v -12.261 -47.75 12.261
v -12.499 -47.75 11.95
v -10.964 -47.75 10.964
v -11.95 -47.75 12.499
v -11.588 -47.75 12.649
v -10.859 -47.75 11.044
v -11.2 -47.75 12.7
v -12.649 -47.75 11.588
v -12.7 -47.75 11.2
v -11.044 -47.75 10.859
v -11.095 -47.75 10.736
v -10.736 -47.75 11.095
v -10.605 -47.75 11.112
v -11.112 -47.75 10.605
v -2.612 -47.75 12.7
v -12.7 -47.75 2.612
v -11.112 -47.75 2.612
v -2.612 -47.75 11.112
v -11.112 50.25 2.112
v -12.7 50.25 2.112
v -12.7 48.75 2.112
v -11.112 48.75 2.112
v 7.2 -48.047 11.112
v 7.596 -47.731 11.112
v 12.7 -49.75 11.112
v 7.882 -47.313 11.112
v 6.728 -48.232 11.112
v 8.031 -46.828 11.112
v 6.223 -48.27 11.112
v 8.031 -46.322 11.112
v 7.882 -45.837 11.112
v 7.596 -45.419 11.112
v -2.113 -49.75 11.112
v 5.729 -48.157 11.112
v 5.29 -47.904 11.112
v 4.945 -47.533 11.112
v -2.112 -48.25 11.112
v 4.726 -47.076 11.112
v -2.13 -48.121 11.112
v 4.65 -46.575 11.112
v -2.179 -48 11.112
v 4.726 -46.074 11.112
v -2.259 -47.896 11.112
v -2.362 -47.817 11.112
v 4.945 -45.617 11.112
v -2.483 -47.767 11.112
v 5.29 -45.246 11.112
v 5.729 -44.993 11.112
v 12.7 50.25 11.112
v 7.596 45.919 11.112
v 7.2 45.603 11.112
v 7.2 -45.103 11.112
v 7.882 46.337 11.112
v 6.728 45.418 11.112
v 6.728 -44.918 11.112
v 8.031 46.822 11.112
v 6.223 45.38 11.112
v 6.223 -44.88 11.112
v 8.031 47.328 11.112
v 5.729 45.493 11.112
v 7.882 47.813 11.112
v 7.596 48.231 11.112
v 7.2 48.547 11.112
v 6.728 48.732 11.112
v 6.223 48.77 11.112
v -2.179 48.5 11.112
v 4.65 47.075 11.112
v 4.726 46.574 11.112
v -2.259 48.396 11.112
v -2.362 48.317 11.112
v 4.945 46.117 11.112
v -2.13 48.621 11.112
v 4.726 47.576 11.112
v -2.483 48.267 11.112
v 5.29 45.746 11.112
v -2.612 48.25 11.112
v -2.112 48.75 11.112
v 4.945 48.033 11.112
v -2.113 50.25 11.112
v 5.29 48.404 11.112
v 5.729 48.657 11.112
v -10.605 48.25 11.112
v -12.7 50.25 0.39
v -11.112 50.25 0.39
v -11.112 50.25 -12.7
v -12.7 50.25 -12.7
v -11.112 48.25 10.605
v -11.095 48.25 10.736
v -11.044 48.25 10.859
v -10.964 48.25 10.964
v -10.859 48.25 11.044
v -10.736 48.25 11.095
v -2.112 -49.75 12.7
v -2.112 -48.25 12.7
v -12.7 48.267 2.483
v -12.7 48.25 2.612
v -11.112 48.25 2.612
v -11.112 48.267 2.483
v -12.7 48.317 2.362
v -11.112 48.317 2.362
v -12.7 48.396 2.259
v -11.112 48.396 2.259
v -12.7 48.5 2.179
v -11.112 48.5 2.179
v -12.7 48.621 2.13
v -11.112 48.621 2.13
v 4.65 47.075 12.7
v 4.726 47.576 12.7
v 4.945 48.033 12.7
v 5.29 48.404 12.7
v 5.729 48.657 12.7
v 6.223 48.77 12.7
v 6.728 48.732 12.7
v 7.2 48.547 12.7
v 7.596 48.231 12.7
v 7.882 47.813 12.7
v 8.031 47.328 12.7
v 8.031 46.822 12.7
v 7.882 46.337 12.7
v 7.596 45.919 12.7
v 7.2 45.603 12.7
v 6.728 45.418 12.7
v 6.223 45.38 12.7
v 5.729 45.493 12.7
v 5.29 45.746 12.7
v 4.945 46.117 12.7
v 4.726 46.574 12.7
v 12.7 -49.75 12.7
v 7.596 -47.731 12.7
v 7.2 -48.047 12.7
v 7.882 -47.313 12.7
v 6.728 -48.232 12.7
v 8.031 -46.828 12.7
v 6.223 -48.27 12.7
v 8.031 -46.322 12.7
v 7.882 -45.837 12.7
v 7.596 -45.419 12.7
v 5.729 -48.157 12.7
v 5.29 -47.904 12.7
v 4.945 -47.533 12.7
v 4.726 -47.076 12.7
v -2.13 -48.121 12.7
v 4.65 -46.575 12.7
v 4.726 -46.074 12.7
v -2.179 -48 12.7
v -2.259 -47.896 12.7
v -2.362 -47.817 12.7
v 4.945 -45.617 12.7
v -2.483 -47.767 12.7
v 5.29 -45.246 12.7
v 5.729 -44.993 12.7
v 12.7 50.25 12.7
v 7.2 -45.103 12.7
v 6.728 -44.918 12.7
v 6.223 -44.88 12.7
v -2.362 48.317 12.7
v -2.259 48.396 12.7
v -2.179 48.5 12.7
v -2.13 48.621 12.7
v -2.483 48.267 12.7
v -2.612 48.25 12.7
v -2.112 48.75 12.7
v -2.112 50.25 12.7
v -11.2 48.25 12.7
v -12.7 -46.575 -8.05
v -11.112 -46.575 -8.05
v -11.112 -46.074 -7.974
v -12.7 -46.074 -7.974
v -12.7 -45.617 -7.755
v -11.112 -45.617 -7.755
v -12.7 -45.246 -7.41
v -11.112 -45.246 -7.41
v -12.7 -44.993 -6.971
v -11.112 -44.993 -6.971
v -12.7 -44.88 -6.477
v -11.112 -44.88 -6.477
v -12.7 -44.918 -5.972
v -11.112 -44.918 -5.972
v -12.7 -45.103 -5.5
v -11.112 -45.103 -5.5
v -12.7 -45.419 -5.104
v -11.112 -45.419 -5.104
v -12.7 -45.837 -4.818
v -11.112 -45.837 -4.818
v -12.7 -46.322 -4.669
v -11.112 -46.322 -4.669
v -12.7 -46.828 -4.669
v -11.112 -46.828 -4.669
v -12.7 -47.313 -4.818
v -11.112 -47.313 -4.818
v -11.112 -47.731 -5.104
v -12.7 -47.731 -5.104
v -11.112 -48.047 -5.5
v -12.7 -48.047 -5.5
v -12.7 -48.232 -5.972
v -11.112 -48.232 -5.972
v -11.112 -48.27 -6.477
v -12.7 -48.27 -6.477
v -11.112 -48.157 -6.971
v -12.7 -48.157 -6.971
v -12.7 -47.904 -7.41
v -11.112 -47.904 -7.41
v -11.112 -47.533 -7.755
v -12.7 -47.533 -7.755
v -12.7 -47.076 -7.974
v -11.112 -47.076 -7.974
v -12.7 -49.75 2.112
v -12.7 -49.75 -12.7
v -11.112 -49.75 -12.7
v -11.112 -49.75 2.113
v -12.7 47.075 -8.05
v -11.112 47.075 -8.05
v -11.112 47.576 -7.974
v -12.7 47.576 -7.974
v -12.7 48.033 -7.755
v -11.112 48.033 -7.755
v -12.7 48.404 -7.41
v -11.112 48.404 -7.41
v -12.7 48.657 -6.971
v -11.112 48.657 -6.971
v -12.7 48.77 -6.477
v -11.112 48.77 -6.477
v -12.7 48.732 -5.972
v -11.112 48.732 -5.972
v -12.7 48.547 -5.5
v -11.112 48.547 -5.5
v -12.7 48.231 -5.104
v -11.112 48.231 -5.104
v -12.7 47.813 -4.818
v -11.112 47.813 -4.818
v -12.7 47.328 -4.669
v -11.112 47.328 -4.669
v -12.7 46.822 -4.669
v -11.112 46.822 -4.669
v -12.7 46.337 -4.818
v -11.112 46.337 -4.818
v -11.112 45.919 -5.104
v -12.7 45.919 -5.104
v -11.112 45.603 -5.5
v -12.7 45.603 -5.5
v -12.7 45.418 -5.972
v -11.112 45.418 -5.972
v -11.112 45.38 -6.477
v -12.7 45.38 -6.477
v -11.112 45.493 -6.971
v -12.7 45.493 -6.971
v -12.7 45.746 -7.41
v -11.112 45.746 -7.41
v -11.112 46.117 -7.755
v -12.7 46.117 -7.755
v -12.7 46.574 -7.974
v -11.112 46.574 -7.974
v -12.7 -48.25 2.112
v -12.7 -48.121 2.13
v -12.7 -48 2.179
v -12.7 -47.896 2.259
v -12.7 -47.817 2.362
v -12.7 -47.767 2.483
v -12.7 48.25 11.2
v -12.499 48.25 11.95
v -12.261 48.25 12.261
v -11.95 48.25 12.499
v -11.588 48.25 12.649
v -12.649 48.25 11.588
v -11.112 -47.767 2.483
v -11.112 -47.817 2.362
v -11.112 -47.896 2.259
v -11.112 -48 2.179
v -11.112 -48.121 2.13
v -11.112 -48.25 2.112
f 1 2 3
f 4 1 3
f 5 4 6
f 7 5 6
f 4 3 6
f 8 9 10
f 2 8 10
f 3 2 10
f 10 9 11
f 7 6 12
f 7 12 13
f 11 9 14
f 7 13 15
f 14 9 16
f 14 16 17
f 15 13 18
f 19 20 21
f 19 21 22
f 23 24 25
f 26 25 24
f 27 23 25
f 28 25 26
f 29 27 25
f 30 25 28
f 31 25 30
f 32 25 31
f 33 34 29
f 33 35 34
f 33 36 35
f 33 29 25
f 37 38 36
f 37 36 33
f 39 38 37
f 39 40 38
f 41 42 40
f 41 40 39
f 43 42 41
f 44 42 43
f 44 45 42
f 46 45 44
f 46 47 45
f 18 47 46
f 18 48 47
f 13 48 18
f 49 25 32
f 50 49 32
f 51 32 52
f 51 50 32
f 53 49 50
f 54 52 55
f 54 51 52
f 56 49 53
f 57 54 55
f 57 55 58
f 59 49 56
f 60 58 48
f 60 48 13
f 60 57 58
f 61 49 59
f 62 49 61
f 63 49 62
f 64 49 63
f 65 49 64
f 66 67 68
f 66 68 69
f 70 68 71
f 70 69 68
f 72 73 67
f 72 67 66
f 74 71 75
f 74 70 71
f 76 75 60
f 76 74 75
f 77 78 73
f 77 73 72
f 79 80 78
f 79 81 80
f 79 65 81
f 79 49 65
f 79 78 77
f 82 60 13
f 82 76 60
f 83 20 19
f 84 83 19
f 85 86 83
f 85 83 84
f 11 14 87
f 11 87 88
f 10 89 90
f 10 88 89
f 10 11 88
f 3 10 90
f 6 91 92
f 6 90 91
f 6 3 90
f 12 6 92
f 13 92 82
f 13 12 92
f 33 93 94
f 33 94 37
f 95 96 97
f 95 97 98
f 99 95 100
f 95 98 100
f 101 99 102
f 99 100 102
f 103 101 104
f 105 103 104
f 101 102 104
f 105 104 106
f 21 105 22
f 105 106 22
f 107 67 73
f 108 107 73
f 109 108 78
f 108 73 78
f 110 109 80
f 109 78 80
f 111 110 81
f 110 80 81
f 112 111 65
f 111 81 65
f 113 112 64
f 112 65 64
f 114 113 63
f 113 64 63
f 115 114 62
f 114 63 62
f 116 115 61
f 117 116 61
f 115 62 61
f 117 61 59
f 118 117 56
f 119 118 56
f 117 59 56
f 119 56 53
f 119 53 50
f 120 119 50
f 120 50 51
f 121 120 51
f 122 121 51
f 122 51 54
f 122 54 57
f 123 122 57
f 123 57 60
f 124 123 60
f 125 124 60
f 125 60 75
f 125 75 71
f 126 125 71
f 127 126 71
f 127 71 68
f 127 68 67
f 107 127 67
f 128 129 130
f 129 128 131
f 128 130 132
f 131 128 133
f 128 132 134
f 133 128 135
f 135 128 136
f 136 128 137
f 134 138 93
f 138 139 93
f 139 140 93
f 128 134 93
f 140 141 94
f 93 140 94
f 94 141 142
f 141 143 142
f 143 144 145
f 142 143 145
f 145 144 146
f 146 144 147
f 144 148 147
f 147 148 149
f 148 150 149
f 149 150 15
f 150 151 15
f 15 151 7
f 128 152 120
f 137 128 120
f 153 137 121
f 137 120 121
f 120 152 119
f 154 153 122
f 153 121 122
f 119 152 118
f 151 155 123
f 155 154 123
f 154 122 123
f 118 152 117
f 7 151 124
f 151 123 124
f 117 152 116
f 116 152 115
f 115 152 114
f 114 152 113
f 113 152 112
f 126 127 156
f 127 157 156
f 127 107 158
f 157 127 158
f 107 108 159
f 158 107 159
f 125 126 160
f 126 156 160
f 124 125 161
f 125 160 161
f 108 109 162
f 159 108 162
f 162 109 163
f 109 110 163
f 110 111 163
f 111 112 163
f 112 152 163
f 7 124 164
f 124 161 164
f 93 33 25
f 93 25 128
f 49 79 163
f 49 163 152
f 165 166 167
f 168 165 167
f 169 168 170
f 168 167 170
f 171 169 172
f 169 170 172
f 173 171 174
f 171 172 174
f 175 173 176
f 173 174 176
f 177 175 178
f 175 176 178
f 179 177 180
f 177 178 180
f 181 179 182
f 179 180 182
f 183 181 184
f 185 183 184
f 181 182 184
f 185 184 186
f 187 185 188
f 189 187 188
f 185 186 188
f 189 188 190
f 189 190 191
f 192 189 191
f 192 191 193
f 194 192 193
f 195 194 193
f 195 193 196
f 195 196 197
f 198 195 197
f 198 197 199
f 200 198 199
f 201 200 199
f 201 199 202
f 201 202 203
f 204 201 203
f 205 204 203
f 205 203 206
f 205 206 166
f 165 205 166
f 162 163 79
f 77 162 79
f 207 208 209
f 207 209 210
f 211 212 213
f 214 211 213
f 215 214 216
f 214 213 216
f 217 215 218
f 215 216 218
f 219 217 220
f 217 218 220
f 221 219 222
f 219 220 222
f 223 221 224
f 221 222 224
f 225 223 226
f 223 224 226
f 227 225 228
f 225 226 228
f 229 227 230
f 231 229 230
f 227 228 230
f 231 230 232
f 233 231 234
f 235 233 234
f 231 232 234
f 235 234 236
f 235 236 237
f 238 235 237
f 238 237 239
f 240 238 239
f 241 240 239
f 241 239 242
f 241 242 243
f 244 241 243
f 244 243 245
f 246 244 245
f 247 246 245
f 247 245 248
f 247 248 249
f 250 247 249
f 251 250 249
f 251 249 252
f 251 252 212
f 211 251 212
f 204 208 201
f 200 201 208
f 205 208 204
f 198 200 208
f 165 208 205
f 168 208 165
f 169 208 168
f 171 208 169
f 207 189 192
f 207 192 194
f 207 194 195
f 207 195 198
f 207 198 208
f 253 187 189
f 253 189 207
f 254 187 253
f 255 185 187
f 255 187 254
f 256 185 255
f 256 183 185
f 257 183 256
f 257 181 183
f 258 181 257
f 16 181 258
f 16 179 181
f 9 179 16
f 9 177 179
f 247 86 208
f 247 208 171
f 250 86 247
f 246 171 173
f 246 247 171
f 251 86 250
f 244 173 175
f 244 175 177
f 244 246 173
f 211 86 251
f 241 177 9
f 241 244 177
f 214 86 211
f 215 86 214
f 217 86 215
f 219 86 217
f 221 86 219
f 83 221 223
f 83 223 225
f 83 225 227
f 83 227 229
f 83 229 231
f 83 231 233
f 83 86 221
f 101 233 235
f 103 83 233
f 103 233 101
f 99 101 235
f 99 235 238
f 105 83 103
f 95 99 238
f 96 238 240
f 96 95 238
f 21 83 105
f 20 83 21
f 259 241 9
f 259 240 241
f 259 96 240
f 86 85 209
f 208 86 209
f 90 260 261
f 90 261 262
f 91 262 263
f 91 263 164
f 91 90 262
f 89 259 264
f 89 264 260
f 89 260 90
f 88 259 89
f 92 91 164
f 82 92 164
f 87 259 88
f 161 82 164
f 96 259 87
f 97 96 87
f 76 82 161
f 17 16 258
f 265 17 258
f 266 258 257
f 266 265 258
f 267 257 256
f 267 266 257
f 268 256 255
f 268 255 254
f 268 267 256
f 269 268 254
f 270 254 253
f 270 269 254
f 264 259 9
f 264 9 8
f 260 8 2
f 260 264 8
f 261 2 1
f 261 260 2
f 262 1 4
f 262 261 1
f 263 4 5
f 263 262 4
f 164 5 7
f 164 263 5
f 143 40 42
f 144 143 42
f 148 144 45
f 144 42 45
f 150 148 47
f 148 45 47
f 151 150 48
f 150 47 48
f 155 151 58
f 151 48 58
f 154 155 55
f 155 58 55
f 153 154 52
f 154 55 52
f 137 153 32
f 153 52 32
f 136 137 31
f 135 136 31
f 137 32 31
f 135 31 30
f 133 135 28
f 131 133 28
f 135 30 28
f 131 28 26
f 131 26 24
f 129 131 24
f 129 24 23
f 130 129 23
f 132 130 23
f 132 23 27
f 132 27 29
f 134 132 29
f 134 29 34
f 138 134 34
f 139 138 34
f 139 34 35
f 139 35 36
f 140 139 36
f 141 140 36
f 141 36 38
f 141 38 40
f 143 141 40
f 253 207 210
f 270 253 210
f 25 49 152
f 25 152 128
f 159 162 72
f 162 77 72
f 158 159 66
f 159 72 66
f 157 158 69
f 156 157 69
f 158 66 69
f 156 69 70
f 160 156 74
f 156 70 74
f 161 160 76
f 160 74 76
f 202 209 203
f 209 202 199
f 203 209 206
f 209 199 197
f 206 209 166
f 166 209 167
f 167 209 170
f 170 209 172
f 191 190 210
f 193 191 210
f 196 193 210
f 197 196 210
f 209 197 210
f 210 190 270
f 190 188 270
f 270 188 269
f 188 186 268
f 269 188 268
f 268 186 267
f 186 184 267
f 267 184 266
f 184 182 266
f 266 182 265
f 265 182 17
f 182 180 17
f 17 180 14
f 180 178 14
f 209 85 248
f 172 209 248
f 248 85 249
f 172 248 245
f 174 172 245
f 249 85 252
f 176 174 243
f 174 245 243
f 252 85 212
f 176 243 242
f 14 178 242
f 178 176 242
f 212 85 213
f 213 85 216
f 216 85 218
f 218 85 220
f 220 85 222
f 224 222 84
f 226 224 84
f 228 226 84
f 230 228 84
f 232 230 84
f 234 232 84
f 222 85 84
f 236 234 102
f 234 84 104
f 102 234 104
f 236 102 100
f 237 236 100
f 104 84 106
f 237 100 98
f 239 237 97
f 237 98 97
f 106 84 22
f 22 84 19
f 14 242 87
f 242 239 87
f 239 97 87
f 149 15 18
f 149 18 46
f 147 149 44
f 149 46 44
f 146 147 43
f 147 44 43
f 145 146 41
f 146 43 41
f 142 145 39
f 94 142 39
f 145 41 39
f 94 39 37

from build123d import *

# Parameters (mm, degrees)
SKETCH1_W            = 25.4
SKETCH1_H            = 25.4
BOSS_EXTRUDE1_DEPTH  = 56.75
SKETCH2_W            = 23.8125
SKETCH2_H            = 23.8125
CUT_EXTRUDE1_DEPTH   = 115.912270885
FILLET1_R            = 0.508
M3_CLEARANCE_HOLE1_D = 3.4
M3_CLEARANCE_HOLE2_D = 3.4
M3_CLEARANCE_HOLE3_D = 3.4
M3_CLEARANCE_HOLE4_D = 3.4
FILLET2_R            = 1.5
CUT_EXTRUDE2_REACH   = 65.459
SKETCH11_W           = 16.9
SKETCH11_H           = 6.499999954
SKETCH11_H_2         = 7
CUT_EXTRUDE3_REACH   = 65.459
SKETCH12_W           = 16.9
SKETCH12_H           = 6.5
SKETCH12_H_2         = 7
FILLET3_R            = 3.81
CUT_EXTRUDE4_REACH   = 65.459
SKETCH13_W           = 15.4
SKETCH13_H           = 87.3
CUT_EXTRUDE5_REACH   = 65.459
SKETCH14_W           = 15.4
SKETCH14_H           = 87.3
CHAMFER2_SIZE        = 6.35
FILLET5_R            = 3.81
SKETCH15_W           = 12.31
SKETCH15_H           = 12.31
CUT_EXTRUDE6_DEPTH   = 6.5
SKETCH17_W           = 12.31
SKETCH17_H           = 12.31
CUT_EXTRUDE8_DEPTH   = 7
BOSS_EXTRUDE2_START  = -1.5875
BOSS_EXTRUDE2_DEPTH  = 1.5875
BOSS_EXTRUDE3_START  = -1.5875
BOSS_EXTRUDE3_DEPTH  = 1.5875
SKETCH22_W           = 10.5875
SKETCH22_H           = 10.5875
CUT_EXTRUDE9_DEPTH   = 2
FILLET6_R            = 0.5
FILLET6_OF_MIRROR1_R = 0.5


with BuildPart() as part:
    # Sketch1 → Boss-Extrude1 (new, symmetric)
    with BuildSketch(Plane(origin=(0, 0, 0), x_dir=(1, 0, 0), z_dir=(0, 1, 0))):
        Rectangle(SKETCH1_W, SKETCH1_H)
    extrude(amount=BOSS_EXTRUDE1_DEPTH, both=True)

    # Sketch2 → Cut-Extrude1 (cut, through all)
    with BuildSketch(Plane(origin=(0, 56.75, 0), x_dir=(1, 0, 0), z_dir=(0, 1, 0))):
        with Locations((0.79375, 0.79375)):
            Rectangle(SKETCH2_W, SKETCH2_H)
    extrude(amount=-CUT_EXTRUDE1_DEPTH, mode=Mode.SUBTRACT)

    # Fillet1
    fillet1_edges = [part.edges().sort_by_distance(p)[0] for p in [
        (-11.1125, 0, 11.1125),
    ]]
    fillet(fillet1_edges, radius=FILLET1_R)

    # M3 Clearance Hole1 (through all)
    with Locations(Plane.XY.offset(12.7)):
        with Locations((6.35, 47.075)):
            Hole(M3_CLEARANCE_HOLE1_D / 2)

    # M3 Clearance Hole2 (through all)
    with Locations(Plane.ZY.offset(12.7)):
        with Locations((-6.35, 47.075)):
            Hole(M3_CLEARANCE_HOLE2_D / 2)

    # M3 Clearance Hole3 (through all)
    with Locations(Plane.XY.offset(12.7)):
        with Locations((6.35, -46.575)):
            Hole(M3_CLEARANCE_HOLE3_D / 2)

    # M3 Clearance Hole4 (through all)
    with Locations(Plane.ZY.offset(12.7)):
        with Locations((-6.35, -46.575)):
            Hole(M3_CLEARANCE_HOLE4_D / 2)

    # Fillet2
    fillet2_edges = [part.edges().sort_by_distance(p)[0] for p in [
        (-12.7, 0, 12.7),
    ]]
    fillet(fillet2_edges, radius=FILLET2_R)

    # Sketch11 → Cut-Extrude2 (cut, up to next)
    with BuildSketch(Plane.ZY.offset(12.7), mode=Mode.PRIVATE) as cut_extrude2_sk1:
        with Locations((-4.25, 53.500000023)):
            Rectangle(SKETCH11_W, SKETCH11_H)
    cut_extrude2_tool1 = extrude(cut_extrude2_sk1.sketch, amount=-CUT_EXTRUDE2_REACH, mode=Mode.PRIVATE) & part.part
    # Sketch11 → Cut-Extrude2 (cut, up to next)
    with BuildSketch(Plane.ZY.offset(12.7), mode=Mode.PRIVATE) as cut_extrude2_sk2:
        with Locations((-4.25, -53.25)):
            Rectangle(SKETCH11_W, SKETCH11_H_2)
    cut_extrude2_tool2 = extrude(cut_extrude2_sk2.sketch, amount=-CUT_EXTRUDE2_REACH, mode=Mode.PRIVATE) & part.part
    add(cut_extrude2_tool1.solids().sort_by_distance((-12.7, 53.5, -4.25))[0], mode=Mode.SUBTRACT)
    add(cut_extrude2_tool2.solids().sort_by_distance((-12.7, -53.25, -4.25))[0], mode=Mode.SUBTRACT)

    # Sketch12 → Cut-Extrude3 (cut, up to next)
    with BuildSketch(Plane.XY.offset(12.7), mode=Mode.PRIVATE) as cut_extrude3_sk1:
        with Locations((4.25, 53.5)):
            Rectangle(SKETCH12_W, SKETCH12_H)
    cut_extrude3_tool1 = extrude(cut_extrude3_sk1.sketch, amount=-CUT_EXTRUDE3_REACH, mode=Mode.PRIVATE) & part.part
    # Sketch12 → Cut-Extrude3 (cut, up to next)
    with BuildSketch(Plane.XY.offset(12.7), mode=Mode.PRIVATE) as cut_extrude3_sk2:
        with Locations((4.25, -53.25)):
            Rectangle(SKETCH12_W, SKETCH12_H_2)
    cut_extrude3_tool2 = extrude(cut_extrude3_sk2.sketch, amount=-CUT_EXTRUDE3_REACH, mode=Mode.PRIVATE) & part.part
    add(cut_extrude3_tool1.solids().sort_by_distance((4.25, 53.5, 12.7))[0], mode=Mode.SUBTRACT)
    add(cut_extrude3_tool2.solids().sort_by_distance((4.25, -53.25, 12.7))[0], mode=Mode.SUBTRACT)

    # Fillet3
    fillet3_edges = [part.edges().sort_by_distance(p)[0] for p in [
        (-4.2, 50.25, 11.90625),
        (-4.2, -49.75, 11.90625),
        (-11.90625, 50.250000046, 4.2),
        (-11.90625, -49.75, 4.2),
    ]]
    fillet(fillet3_edges, radius=FILLET3_R)

    # Sketch13 → Cut-Extrude4 (cut, up to next)
    with BuildSketch(Plane.ZY.offset(12.7), mode=Mode.PRIVATE) as cut_extrude4_sk1:
        with Locations((-5, 0.25)):
            Rectangle(SKETCH13_W, SKETCH13_H)
    cut_extrude4_tool1 = extrude(cut_extrude4_sk1.sketch, amount=-CUT_EXTRUDE4_REACH, mode=Mode.PRIVATE) & part.part
    add(cut_extrude4_tool1.solids().sort_by_distance((-12.7, 0.25, -5))[0], mode=Mode.SUBTRACT)

    # Sketch14 → Cut-Extrude5 (cut, up to next)
    with BuildSketch(Plane.XY.offset(12.7), mode=Mode.PRIVATE) as cut_extrude5_sk1:
        with Locations((5, 0.25)):
            Rectangle(SKETCH14_W, SKETCH14_H)
    cut_extrude5_tool1 = extrude(cut_extrude5_sk1.sketch, amount=-CUT_EXTRUDE5_REACH, mode=Mode.PRIVATE) & part.part
    add(cut_extrude5_tool1.solids().sort_by_distance((5, 0.25, 12.7))[0], mode=Mode.SUBTRACT)

    # Chamfer2
    chamfer2_edges = [part.edges().sort_by_distance(p)[0] for p in [
        (-11.90625, 43.9, 2.7),
        (-11.90625, -43.4, 2.7),
        (-2.7, -43.4, 11.90625),
        (-2.7, 43.9, 11.90625),
    ]]
    chamfer(chamfer2_edges, length=CHAMFER2_SIZE)

    # Fillet5
    fillet5_edges = [part.edges().sort_by_distance(p)[0] for p in [
        (-11.90625, 43.9, -3.65),
        (-11.90625, -37.05, 2.7),
        (-11.90625, 37.55, 2.7),
        (-2.7, -37.05, 11.90625),
        (-2.7, 37.55, 11.90625),
        (3.65, 43.9, 11.90625),
        (3.65, -43.4, 11.90625),
        (-11.90625, -43.4, -3.65),
    ]]
    fillet(fillet5_edges, radius=FILLET5_R)

    # Sketch15 → Cut-Extrude6 (cut)
    with BuildSketch(Plane(origin=(0, 56.75, 0), x_dir=(1, 0, 0), z_dir=(0, 1, 0))):
        with Locations((-6.545, -6.545)):
            Rectangle(SKETCH15_W, SKETCH15_H)
    extrude(amount=-CUT_EXTRUDE6_DEPTH, mode=Mode.SUBTRACT)

    # Sketch17 → Cut-Extrude8 (cut)
    with BuildSketch(Plane.XZ.offset(56.75)):
        with Locations((-6.545, 6.545)):
            Rectangle(SKETCH17_W, SKETCH17_H)
    extrude(amount=-CUT_EXTRUDE8_DEPTH, mode=Mode.SUBTRACT)

    # Sketch20 → Boss-Extrude2 (add)
    with BuildSketch(Plane.ZY.offset(12.7).offset(BOSS_EXTRUDE2_START)):
        with BuildLine():
            Line((-12.7, 43.9), (-12.7, -43.4))
            Line((-12.7, -43.4), (-5.228153673, -43.4))
            ThreePointArc((-5.228153673, -43.4), (-3.770129795, -43.109981019), (-2.534076836, -42.284076836))
            Line((-2.534076836, -42.284076836), (1.584076836, -38.165923164))
            ThreePointArc((1.584076836, -38.165923164), (2.409981019, -36.929870205), (2.7, -35.471846327))
            Line((2.7, -35.471846327), (2.7, 35.971846327))
            ThreePointArc((2.7, 35.971846327), (2.409981019, 37.429870205), (1.584076836, 38.665923164))
            Line((1.584076836, 38.665923164), (-2.534076836, 42.784076836))
            ThreePointArc((-2.534076836, 42.784076836), (-3.770129795, 43.609981019), (-5.228153673, 43.9))
            Line((-5.228153673, 43.9), (-12.7, 43.9))
        make_face()
    extrude(amount=BOSS_EXTRUDE2_DEPTH)

    # Sketch21 → Boss-Extrude3 (add)
    with BuildSketch(Plane.XY.offset(12.7).offset(BOSS_EXTRUDE3_START)):
        with BuildLine():
            Line((12.7, 43.9), (12.7, -43.4))
            Line((12.7, -43.4), (5.228153673, -43.4))
            ThreePointArc((5.228153673, -43.4), (3.770129795, -43.109981019), (2.534076836, -42.284076836))
            Line((2.534076836, -42.284076836), (-1.584076836, -38.165923164))
            ThreePointArc((-1.584076836, -38.165923164), (-2.409981019, -36.929870205), (-2.7, -35.471846327))
            Line((-2.7, -35.471846327), (-2.7, 35.971846327))
            ThreePointArc((-2.7, 35.971846327), (-2.409981019, 37.429870205), (-1.584076836, 38.665923164))
            Line((-1.584076836, 38.665923164), (2.534076836, 42.784076836))
            ThreePointArc((2.534076836, 42.784076836), (3.770129795, 43.609981019), (5.228153673, 43.9))
            Line((5.228153673, 43.9), (12.7, 43.9))
        make_face()
    extrude(amount=BOSS_EXTRUDE3_DEPTH)

    # Sketch22 → Cut-Extrude9 (cut)
    with BuildSketch(Plane(origin=(0, 50.250000046, 0), x_dir=(1, 0, 0), z_dir=(0, 1, 0))):
        with Locations((-7.40625, -7.40625)):
            Rectangle(SKETCH22_W, SKETCH22_H)
    cut_extrude9 = extrude(amount=-CUT_EXTRUDE9_DEPTH, mode=Mode.SUBTRACT)

    # Fillet6
    fillet6_edges = [part.edges().sort_by_distance(p)[0] for p in [
        (-11.90625, 48.250000046, 2.1125),
        (-2.1125, 48.250000046, 11.90625),
    ]]
    fillet(fillet6_edges, radius=FILLET6_R)

    # Mirror1: Cut-Extrude9 across plane
    add(cut_extrude9.mirror(Plane.ZX.offset(0.250000023)), mode=Mode.SUBTRACT)

    # Fillet6 of Mirror1
    fillet6_of_mirror1_edges = [part.edges().sort_by_distance(p)[0] for p in [
        (-11.90625, -47.75, 2.1125),
        (-2.1125, -47.75, 11.90625),
    ]]
    fillet(fillet6_of_mirror1_edges, radius=FILLET6_OF_MIRROR1_R)


solid = part.part
